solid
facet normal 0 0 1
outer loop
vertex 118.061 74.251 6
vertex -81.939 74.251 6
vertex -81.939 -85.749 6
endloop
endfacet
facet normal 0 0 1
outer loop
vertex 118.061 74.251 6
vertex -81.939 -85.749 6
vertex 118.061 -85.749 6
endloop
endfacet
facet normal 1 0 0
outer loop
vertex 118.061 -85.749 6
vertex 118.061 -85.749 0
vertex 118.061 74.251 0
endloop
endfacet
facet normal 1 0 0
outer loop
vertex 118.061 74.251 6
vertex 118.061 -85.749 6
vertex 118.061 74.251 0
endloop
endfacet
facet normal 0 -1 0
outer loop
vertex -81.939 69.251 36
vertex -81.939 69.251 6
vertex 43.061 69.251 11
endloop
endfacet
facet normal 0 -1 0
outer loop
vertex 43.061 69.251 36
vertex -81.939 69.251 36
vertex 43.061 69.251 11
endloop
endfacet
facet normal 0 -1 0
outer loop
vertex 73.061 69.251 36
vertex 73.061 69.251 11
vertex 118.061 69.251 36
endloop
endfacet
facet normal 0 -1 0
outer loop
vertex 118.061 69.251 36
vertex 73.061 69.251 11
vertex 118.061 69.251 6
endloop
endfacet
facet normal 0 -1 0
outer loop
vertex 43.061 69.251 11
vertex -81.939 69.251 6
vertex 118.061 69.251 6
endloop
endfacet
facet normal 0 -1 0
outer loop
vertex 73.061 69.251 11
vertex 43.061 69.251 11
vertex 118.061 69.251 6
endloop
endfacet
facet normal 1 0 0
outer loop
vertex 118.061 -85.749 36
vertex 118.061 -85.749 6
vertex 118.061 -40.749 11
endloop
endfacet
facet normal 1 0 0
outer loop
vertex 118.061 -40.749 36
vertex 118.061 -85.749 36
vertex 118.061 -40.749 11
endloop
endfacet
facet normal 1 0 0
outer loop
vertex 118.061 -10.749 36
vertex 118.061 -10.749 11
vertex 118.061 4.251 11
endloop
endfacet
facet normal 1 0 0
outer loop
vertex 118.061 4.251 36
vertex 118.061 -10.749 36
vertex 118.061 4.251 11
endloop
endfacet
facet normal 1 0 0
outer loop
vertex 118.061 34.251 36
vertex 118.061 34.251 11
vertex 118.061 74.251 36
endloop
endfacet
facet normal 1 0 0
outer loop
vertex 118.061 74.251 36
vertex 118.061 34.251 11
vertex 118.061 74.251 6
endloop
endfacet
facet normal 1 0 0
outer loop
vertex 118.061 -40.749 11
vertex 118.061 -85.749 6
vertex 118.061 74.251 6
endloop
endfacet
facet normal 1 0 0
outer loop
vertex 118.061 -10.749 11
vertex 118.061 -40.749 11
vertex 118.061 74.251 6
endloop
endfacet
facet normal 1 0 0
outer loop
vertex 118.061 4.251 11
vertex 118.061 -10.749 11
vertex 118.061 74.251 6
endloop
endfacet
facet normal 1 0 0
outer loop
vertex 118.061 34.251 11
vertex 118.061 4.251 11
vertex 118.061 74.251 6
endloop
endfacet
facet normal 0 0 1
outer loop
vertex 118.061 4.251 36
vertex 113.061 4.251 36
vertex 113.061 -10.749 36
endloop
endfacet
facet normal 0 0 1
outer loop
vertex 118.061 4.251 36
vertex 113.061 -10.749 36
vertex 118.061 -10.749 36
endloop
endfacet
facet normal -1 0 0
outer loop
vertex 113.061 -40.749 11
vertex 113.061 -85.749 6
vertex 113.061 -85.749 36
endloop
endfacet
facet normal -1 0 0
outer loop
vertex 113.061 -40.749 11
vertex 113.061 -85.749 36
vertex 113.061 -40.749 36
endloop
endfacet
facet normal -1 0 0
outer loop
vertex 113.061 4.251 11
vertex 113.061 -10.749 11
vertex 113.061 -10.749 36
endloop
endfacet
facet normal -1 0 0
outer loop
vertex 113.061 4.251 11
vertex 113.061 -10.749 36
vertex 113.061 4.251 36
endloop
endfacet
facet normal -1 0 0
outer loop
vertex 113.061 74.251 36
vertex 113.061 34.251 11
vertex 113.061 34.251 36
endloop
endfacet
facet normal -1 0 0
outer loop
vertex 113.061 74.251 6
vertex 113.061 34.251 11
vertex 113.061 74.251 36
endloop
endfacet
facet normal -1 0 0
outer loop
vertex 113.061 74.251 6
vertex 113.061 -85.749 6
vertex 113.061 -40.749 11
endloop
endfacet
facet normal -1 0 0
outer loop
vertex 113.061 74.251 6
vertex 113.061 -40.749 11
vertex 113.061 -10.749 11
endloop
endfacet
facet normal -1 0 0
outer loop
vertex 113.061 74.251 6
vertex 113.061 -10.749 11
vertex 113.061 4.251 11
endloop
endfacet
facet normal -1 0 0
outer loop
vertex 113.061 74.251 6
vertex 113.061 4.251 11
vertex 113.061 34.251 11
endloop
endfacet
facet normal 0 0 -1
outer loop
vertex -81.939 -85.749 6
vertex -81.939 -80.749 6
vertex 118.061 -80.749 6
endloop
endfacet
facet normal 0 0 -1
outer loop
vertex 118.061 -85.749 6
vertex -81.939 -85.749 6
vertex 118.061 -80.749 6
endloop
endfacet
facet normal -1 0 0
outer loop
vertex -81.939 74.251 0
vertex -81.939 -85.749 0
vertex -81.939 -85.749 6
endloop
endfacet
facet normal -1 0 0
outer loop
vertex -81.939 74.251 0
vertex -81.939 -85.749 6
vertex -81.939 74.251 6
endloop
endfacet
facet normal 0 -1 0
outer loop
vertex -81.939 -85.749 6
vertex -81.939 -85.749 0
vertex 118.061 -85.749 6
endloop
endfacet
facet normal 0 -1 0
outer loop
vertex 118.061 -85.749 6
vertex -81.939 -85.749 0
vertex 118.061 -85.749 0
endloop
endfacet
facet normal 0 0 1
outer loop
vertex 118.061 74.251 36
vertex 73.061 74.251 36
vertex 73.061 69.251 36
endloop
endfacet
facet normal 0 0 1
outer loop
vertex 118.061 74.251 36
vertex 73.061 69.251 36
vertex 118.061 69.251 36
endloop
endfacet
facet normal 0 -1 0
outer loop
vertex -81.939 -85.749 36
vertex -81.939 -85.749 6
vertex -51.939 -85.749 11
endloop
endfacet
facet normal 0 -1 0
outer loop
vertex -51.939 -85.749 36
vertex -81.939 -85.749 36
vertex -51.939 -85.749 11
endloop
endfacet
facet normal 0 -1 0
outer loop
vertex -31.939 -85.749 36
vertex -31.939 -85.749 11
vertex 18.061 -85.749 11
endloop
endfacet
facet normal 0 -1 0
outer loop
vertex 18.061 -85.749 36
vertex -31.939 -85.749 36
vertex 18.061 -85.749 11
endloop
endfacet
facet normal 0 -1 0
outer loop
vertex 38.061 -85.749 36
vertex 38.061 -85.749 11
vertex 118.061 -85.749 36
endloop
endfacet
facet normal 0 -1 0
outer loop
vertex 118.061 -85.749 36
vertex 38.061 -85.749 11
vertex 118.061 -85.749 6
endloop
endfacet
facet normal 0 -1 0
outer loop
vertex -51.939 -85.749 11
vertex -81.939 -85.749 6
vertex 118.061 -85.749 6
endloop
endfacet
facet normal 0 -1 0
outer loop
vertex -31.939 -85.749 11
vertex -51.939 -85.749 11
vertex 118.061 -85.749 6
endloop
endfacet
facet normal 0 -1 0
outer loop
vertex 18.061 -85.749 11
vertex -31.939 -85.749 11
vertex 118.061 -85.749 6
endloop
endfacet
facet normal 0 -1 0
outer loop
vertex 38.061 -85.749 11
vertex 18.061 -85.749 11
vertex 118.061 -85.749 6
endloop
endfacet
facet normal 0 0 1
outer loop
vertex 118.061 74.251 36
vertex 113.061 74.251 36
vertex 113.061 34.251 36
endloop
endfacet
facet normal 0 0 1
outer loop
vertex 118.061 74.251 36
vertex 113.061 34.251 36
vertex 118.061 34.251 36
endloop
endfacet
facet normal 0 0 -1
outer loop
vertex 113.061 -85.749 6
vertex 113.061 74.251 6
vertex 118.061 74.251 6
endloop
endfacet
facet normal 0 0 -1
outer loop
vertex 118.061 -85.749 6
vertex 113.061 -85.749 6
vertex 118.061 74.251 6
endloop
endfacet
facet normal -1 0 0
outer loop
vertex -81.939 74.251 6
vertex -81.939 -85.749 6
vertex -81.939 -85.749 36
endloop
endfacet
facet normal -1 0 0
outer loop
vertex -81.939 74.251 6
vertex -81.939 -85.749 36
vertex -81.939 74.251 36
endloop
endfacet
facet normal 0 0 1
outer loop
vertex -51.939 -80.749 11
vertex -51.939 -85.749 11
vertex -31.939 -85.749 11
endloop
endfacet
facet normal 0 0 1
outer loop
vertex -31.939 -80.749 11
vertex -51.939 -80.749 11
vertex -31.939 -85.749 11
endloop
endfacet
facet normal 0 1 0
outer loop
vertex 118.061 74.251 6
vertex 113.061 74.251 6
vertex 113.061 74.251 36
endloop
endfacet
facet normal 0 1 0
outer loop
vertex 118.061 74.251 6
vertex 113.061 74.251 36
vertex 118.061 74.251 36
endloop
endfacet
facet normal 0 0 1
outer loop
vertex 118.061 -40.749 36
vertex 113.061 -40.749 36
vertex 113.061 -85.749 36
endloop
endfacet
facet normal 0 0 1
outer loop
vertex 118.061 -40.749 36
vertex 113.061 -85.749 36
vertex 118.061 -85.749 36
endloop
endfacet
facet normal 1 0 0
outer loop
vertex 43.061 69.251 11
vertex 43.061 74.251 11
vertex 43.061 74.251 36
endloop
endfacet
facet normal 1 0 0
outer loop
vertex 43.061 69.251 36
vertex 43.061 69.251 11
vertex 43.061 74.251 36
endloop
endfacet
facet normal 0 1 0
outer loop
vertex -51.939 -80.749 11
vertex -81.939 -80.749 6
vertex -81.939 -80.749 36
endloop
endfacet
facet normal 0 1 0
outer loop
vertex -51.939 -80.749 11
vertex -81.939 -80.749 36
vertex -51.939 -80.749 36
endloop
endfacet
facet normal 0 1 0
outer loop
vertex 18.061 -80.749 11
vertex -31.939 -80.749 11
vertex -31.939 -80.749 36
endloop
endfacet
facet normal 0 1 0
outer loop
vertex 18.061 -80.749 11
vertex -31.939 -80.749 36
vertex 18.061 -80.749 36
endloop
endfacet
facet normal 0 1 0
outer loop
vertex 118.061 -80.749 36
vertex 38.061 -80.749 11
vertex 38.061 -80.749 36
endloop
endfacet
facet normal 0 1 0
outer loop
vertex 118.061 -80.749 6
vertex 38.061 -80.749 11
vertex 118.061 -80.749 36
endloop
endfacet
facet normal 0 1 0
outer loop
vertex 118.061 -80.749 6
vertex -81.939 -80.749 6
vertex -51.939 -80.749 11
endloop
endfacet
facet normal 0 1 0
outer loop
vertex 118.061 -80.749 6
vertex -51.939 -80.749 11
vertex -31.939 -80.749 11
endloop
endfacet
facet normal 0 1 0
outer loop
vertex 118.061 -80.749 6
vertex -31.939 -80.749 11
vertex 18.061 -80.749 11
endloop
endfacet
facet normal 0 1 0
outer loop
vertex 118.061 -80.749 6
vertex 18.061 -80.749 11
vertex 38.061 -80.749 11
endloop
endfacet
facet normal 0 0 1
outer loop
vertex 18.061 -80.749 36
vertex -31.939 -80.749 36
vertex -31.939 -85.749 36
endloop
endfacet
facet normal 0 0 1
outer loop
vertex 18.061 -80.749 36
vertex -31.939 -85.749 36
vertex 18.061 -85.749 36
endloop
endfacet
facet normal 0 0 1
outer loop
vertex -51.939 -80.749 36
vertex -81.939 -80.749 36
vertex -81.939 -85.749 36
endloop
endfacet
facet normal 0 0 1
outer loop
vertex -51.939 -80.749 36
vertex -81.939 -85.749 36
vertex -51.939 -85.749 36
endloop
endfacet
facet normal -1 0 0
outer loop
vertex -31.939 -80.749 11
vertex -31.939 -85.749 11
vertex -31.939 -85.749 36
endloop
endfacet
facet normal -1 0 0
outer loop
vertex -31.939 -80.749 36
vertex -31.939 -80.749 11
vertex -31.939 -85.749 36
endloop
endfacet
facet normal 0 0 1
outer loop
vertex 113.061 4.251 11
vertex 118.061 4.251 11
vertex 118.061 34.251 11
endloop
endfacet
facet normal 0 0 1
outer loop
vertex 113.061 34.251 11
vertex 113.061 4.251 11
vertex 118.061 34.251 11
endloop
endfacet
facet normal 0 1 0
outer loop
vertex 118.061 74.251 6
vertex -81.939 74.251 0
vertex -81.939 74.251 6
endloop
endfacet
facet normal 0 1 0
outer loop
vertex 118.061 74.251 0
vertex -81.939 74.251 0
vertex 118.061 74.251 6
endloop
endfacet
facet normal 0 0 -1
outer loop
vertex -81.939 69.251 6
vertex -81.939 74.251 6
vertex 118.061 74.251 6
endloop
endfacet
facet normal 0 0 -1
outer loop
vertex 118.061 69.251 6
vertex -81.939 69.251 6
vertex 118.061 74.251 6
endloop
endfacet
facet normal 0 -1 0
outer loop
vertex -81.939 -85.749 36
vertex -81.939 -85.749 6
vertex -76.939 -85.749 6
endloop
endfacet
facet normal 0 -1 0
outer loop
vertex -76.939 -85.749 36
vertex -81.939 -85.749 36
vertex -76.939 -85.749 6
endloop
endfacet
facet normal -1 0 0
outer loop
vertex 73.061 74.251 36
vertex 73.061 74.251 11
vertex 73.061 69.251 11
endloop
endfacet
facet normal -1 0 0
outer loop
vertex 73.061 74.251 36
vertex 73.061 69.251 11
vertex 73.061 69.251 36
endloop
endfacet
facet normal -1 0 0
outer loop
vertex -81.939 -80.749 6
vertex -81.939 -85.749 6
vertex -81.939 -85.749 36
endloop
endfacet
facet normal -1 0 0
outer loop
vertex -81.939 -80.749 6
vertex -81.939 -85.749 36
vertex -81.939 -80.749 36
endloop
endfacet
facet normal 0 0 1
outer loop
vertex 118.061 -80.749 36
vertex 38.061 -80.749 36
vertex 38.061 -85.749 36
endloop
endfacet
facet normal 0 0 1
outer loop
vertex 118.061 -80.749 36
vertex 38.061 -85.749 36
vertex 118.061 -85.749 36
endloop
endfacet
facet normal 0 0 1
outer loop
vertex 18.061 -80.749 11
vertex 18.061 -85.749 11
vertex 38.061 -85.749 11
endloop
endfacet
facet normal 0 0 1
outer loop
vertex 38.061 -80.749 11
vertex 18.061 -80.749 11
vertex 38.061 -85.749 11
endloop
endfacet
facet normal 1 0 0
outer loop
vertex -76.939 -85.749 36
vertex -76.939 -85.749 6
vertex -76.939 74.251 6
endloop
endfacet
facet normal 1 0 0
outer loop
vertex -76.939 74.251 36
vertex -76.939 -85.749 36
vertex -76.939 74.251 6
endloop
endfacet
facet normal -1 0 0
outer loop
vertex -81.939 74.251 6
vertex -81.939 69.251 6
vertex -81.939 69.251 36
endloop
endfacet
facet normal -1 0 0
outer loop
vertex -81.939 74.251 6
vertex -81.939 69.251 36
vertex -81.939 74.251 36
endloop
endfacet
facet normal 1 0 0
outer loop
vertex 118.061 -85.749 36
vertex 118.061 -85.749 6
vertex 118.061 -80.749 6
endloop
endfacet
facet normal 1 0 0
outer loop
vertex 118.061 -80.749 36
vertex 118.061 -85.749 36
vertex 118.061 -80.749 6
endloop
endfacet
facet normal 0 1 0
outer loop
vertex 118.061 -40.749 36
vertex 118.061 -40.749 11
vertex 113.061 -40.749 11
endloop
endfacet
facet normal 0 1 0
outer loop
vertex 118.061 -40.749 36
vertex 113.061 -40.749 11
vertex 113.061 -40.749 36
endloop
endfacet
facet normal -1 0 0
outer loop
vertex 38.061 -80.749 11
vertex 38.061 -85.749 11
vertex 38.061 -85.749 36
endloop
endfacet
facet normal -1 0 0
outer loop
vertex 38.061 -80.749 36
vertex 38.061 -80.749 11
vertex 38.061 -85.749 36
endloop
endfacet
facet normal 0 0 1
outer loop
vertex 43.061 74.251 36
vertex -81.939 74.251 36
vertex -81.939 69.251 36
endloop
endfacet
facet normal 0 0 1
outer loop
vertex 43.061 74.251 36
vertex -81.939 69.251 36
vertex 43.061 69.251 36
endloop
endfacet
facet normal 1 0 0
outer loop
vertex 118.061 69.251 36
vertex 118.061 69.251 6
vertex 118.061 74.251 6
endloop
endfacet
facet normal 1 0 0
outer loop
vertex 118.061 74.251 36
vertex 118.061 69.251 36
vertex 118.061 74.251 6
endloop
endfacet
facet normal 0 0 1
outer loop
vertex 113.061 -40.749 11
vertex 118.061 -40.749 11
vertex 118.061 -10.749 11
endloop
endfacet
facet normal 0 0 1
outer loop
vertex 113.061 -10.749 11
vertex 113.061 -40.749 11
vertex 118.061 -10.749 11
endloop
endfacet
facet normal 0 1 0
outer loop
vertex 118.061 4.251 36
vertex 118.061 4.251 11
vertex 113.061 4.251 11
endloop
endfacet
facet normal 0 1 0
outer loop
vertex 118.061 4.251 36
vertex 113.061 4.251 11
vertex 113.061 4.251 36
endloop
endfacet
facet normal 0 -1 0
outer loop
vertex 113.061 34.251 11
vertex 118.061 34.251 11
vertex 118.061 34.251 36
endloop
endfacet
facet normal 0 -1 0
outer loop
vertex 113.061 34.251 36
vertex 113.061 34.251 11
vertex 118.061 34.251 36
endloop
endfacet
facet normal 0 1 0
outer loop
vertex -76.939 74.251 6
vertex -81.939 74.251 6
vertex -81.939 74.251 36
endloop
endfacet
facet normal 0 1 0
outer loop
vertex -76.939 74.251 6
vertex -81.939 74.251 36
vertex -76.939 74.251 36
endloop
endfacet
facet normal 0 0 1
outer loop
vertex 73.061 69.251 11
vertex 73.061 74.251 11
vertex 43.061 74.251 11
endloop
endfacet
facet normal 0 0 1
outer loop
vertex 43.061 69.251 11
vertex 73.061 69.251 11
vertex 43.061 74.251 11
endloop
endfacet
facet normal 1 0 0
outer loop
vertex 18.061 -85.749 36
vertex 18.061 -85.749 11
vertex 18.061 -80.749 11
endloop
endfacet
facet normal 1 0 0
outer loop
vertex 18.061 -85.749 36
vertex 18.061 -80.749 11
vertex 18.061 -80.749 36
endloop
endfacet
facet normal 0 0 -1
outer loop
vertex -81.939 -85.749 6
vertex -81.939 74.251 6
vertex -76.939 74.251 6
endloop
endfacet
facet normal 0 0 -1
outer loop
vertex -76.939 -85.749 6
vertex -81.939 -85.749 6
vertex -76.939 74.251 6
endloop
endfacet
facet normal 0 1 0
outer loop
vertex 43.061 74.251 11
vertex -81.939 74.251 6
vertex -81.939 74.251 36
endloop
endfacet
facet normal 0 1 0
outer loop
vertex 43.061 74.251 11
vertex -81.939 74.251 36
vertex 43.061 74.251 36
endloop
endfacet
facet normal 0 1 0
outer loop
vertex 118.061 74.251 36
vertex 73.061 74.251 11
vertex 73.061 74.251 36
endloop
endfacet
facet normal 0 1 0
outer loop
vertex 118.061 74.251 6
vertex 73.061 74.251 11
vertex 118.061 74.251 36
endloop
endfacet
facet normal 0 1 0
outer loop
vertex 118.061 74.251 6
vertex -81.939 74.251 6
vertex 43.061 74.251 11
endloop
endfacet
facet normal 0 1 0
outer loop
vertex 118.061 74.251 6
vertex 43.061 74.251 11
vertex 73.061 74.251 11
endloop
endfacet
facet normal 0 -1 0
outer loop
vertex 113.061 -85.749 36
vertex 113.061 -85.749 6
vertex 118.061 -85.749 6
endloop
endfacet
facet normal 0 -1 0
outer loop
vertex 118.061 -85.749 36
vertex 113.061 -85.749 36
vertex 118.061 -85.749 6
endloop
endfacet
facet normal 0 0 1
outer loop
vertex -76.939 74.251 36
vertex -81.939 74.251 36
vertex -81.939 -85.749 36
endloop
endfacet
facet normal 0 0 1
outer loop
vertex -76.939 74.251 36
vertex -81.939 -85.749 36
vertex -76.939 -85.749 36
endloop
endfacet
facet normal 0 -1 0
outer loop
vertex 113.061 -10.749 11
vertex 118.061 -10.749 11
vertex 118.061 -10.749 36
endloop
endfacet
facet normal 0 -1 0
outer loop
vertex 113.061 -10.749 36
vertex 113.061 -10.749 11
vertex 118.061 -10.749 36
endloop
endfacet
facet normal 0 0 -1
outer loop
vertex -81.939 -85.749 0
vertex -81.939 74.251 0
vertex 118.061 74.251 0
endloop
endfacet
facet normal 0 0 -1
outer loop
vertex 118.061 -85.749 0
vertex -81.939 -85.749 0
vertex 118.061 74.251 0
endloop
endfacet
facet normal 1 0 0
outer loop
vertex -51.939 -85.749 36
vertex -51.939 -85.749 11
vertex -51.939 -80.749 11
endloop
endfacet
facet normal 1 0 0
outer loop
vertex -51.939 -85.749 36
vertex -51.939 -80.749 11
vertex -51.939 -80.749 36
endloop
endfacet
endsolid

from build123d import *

# Parameters (mm, degrees)
F0_W      = 200
F0_H      = 160
F1_DEPTH  = 6
F2_W      = 200
F2_H      = 5
F3_DEPTH  = 30
F4_W      = 5
F4_H      = 160
F5_DEPTH  = 30
F6_W      = 200
F6_H      = 5
F7_DEPTH  = 30
F8_W      = 20
F8_H      = 25
F9_DEPTH  = 25
F10_W     = 20
F10_H     = 25
F11_DEPTH = 25
F12_W     = 5
F12_H     = 160
F13_DEPTH = 30
F14_W     = 30
F14_H     = 25
F15_DEPTH = 25
F16_W     = 30
F16_H     = 25
F17_DEPTH = 25
F18_W     = 30
F18_H     = 25
F19_DEPTH = 25


with BuildPart() as f1:
    # F0 (on Top) → F1 (new body)
    with BuildSketch(Plane.XY):
        with Locations((18.061473, -5.748522)):
            Rectangle(F0_W, F0_H)
    extrude(amount=F1_DEPTH)


with BuildPart() as f3:
    # F2 (on face) → F3 (new body)
    with BuildSketch(Plane.XY.offset(6)):
        with Locations((18.061473, 71.751478)):
            Rectangle(F2_W, F2_H)
    extrude(amount=F3_DEPTH)

    # F18 (on face) → F19 (cut)
    with BuildSketch(Plane(origin=(0, 74.251478, 0), x_dir=(-1, 0, 0), z_dir=(0, 1, 0))):
        with Locations((-58.061473, 23.5)):
            Rectangle(F18_W, F18_H)
    extrude(amount=-F19_DEPTH, mode=Mode.SUBTRACT)


with BuildPart() as f5:
    # F4 (on face) → F5 (new body)
    with BuildSketch(Plane.XY.offset(6)):
        with Locations((-79.438527, -5.748522)):
            Rectangle(F4_W, F4_H)
    extrude(amount=F5_DEPTH)


with BuildPart() as f7:
    # F6 (on face) → F7 (new body)
    with BuildSketch(Plane.XY.offset(6)):
        with Locations((18.061473, -83.248522)):
            Rectangle(F6_W, F6_H)
    extrude(amount=F7_DEPTH)

    # F8 (on face) → F9 (cut)
    with BuildSketch(Plane.XZ.offset(85.748522)):
        with Locations((-41.938527, 23.5)):
            Rectangle(F8_W, F8_H)
    extrude(amount=-F9_DEPTH, mode=Mode.SUBTRACT)

    # F10 (on face) → F11 (cut)
    with BuildSketch(Plane.XZ.offset(85.748522)):
        with Locations((28.061473, 23.5)):
            Rectangle(F10_W, F10_H)
    extrude(amount=-F11_DEPTH, mode=Mode.SUBTRACT)


with BuildPart() as f13:
    # F12 (on face) → F13 (new body)
    with BuildSketch(Plane.XY.offset(6)):
        with Locations((115.561473, -5.748522)):
            Rectangle(F12_W, F12_H)
    extrude(amount=F13_DEPTH)

    # F14 (on face) → F15 (cut)
    with BuildSketch(Plane.YZ.offset(118.061473)):
        with Locations((-25.748522, 23.5)):
            Rectangle(F14_W, F14_H)
    extrude(amount=-F15_DEPTH, mode=Mode.SUBTRACT)

    # F16 (on face) → F17 (cut)
    with BuildSketch(Plane.YZ.offset(118.061473)):
        with Locations((19.251478, 23.5)):
            Rectangle(F16_W, F16_H)
    extrude(amount=-F17_DEPTH, mode=Mode.SUBTRACT)


solid = Compound([f1.part, f3.part, f5.part, f7.part, f13.part])
